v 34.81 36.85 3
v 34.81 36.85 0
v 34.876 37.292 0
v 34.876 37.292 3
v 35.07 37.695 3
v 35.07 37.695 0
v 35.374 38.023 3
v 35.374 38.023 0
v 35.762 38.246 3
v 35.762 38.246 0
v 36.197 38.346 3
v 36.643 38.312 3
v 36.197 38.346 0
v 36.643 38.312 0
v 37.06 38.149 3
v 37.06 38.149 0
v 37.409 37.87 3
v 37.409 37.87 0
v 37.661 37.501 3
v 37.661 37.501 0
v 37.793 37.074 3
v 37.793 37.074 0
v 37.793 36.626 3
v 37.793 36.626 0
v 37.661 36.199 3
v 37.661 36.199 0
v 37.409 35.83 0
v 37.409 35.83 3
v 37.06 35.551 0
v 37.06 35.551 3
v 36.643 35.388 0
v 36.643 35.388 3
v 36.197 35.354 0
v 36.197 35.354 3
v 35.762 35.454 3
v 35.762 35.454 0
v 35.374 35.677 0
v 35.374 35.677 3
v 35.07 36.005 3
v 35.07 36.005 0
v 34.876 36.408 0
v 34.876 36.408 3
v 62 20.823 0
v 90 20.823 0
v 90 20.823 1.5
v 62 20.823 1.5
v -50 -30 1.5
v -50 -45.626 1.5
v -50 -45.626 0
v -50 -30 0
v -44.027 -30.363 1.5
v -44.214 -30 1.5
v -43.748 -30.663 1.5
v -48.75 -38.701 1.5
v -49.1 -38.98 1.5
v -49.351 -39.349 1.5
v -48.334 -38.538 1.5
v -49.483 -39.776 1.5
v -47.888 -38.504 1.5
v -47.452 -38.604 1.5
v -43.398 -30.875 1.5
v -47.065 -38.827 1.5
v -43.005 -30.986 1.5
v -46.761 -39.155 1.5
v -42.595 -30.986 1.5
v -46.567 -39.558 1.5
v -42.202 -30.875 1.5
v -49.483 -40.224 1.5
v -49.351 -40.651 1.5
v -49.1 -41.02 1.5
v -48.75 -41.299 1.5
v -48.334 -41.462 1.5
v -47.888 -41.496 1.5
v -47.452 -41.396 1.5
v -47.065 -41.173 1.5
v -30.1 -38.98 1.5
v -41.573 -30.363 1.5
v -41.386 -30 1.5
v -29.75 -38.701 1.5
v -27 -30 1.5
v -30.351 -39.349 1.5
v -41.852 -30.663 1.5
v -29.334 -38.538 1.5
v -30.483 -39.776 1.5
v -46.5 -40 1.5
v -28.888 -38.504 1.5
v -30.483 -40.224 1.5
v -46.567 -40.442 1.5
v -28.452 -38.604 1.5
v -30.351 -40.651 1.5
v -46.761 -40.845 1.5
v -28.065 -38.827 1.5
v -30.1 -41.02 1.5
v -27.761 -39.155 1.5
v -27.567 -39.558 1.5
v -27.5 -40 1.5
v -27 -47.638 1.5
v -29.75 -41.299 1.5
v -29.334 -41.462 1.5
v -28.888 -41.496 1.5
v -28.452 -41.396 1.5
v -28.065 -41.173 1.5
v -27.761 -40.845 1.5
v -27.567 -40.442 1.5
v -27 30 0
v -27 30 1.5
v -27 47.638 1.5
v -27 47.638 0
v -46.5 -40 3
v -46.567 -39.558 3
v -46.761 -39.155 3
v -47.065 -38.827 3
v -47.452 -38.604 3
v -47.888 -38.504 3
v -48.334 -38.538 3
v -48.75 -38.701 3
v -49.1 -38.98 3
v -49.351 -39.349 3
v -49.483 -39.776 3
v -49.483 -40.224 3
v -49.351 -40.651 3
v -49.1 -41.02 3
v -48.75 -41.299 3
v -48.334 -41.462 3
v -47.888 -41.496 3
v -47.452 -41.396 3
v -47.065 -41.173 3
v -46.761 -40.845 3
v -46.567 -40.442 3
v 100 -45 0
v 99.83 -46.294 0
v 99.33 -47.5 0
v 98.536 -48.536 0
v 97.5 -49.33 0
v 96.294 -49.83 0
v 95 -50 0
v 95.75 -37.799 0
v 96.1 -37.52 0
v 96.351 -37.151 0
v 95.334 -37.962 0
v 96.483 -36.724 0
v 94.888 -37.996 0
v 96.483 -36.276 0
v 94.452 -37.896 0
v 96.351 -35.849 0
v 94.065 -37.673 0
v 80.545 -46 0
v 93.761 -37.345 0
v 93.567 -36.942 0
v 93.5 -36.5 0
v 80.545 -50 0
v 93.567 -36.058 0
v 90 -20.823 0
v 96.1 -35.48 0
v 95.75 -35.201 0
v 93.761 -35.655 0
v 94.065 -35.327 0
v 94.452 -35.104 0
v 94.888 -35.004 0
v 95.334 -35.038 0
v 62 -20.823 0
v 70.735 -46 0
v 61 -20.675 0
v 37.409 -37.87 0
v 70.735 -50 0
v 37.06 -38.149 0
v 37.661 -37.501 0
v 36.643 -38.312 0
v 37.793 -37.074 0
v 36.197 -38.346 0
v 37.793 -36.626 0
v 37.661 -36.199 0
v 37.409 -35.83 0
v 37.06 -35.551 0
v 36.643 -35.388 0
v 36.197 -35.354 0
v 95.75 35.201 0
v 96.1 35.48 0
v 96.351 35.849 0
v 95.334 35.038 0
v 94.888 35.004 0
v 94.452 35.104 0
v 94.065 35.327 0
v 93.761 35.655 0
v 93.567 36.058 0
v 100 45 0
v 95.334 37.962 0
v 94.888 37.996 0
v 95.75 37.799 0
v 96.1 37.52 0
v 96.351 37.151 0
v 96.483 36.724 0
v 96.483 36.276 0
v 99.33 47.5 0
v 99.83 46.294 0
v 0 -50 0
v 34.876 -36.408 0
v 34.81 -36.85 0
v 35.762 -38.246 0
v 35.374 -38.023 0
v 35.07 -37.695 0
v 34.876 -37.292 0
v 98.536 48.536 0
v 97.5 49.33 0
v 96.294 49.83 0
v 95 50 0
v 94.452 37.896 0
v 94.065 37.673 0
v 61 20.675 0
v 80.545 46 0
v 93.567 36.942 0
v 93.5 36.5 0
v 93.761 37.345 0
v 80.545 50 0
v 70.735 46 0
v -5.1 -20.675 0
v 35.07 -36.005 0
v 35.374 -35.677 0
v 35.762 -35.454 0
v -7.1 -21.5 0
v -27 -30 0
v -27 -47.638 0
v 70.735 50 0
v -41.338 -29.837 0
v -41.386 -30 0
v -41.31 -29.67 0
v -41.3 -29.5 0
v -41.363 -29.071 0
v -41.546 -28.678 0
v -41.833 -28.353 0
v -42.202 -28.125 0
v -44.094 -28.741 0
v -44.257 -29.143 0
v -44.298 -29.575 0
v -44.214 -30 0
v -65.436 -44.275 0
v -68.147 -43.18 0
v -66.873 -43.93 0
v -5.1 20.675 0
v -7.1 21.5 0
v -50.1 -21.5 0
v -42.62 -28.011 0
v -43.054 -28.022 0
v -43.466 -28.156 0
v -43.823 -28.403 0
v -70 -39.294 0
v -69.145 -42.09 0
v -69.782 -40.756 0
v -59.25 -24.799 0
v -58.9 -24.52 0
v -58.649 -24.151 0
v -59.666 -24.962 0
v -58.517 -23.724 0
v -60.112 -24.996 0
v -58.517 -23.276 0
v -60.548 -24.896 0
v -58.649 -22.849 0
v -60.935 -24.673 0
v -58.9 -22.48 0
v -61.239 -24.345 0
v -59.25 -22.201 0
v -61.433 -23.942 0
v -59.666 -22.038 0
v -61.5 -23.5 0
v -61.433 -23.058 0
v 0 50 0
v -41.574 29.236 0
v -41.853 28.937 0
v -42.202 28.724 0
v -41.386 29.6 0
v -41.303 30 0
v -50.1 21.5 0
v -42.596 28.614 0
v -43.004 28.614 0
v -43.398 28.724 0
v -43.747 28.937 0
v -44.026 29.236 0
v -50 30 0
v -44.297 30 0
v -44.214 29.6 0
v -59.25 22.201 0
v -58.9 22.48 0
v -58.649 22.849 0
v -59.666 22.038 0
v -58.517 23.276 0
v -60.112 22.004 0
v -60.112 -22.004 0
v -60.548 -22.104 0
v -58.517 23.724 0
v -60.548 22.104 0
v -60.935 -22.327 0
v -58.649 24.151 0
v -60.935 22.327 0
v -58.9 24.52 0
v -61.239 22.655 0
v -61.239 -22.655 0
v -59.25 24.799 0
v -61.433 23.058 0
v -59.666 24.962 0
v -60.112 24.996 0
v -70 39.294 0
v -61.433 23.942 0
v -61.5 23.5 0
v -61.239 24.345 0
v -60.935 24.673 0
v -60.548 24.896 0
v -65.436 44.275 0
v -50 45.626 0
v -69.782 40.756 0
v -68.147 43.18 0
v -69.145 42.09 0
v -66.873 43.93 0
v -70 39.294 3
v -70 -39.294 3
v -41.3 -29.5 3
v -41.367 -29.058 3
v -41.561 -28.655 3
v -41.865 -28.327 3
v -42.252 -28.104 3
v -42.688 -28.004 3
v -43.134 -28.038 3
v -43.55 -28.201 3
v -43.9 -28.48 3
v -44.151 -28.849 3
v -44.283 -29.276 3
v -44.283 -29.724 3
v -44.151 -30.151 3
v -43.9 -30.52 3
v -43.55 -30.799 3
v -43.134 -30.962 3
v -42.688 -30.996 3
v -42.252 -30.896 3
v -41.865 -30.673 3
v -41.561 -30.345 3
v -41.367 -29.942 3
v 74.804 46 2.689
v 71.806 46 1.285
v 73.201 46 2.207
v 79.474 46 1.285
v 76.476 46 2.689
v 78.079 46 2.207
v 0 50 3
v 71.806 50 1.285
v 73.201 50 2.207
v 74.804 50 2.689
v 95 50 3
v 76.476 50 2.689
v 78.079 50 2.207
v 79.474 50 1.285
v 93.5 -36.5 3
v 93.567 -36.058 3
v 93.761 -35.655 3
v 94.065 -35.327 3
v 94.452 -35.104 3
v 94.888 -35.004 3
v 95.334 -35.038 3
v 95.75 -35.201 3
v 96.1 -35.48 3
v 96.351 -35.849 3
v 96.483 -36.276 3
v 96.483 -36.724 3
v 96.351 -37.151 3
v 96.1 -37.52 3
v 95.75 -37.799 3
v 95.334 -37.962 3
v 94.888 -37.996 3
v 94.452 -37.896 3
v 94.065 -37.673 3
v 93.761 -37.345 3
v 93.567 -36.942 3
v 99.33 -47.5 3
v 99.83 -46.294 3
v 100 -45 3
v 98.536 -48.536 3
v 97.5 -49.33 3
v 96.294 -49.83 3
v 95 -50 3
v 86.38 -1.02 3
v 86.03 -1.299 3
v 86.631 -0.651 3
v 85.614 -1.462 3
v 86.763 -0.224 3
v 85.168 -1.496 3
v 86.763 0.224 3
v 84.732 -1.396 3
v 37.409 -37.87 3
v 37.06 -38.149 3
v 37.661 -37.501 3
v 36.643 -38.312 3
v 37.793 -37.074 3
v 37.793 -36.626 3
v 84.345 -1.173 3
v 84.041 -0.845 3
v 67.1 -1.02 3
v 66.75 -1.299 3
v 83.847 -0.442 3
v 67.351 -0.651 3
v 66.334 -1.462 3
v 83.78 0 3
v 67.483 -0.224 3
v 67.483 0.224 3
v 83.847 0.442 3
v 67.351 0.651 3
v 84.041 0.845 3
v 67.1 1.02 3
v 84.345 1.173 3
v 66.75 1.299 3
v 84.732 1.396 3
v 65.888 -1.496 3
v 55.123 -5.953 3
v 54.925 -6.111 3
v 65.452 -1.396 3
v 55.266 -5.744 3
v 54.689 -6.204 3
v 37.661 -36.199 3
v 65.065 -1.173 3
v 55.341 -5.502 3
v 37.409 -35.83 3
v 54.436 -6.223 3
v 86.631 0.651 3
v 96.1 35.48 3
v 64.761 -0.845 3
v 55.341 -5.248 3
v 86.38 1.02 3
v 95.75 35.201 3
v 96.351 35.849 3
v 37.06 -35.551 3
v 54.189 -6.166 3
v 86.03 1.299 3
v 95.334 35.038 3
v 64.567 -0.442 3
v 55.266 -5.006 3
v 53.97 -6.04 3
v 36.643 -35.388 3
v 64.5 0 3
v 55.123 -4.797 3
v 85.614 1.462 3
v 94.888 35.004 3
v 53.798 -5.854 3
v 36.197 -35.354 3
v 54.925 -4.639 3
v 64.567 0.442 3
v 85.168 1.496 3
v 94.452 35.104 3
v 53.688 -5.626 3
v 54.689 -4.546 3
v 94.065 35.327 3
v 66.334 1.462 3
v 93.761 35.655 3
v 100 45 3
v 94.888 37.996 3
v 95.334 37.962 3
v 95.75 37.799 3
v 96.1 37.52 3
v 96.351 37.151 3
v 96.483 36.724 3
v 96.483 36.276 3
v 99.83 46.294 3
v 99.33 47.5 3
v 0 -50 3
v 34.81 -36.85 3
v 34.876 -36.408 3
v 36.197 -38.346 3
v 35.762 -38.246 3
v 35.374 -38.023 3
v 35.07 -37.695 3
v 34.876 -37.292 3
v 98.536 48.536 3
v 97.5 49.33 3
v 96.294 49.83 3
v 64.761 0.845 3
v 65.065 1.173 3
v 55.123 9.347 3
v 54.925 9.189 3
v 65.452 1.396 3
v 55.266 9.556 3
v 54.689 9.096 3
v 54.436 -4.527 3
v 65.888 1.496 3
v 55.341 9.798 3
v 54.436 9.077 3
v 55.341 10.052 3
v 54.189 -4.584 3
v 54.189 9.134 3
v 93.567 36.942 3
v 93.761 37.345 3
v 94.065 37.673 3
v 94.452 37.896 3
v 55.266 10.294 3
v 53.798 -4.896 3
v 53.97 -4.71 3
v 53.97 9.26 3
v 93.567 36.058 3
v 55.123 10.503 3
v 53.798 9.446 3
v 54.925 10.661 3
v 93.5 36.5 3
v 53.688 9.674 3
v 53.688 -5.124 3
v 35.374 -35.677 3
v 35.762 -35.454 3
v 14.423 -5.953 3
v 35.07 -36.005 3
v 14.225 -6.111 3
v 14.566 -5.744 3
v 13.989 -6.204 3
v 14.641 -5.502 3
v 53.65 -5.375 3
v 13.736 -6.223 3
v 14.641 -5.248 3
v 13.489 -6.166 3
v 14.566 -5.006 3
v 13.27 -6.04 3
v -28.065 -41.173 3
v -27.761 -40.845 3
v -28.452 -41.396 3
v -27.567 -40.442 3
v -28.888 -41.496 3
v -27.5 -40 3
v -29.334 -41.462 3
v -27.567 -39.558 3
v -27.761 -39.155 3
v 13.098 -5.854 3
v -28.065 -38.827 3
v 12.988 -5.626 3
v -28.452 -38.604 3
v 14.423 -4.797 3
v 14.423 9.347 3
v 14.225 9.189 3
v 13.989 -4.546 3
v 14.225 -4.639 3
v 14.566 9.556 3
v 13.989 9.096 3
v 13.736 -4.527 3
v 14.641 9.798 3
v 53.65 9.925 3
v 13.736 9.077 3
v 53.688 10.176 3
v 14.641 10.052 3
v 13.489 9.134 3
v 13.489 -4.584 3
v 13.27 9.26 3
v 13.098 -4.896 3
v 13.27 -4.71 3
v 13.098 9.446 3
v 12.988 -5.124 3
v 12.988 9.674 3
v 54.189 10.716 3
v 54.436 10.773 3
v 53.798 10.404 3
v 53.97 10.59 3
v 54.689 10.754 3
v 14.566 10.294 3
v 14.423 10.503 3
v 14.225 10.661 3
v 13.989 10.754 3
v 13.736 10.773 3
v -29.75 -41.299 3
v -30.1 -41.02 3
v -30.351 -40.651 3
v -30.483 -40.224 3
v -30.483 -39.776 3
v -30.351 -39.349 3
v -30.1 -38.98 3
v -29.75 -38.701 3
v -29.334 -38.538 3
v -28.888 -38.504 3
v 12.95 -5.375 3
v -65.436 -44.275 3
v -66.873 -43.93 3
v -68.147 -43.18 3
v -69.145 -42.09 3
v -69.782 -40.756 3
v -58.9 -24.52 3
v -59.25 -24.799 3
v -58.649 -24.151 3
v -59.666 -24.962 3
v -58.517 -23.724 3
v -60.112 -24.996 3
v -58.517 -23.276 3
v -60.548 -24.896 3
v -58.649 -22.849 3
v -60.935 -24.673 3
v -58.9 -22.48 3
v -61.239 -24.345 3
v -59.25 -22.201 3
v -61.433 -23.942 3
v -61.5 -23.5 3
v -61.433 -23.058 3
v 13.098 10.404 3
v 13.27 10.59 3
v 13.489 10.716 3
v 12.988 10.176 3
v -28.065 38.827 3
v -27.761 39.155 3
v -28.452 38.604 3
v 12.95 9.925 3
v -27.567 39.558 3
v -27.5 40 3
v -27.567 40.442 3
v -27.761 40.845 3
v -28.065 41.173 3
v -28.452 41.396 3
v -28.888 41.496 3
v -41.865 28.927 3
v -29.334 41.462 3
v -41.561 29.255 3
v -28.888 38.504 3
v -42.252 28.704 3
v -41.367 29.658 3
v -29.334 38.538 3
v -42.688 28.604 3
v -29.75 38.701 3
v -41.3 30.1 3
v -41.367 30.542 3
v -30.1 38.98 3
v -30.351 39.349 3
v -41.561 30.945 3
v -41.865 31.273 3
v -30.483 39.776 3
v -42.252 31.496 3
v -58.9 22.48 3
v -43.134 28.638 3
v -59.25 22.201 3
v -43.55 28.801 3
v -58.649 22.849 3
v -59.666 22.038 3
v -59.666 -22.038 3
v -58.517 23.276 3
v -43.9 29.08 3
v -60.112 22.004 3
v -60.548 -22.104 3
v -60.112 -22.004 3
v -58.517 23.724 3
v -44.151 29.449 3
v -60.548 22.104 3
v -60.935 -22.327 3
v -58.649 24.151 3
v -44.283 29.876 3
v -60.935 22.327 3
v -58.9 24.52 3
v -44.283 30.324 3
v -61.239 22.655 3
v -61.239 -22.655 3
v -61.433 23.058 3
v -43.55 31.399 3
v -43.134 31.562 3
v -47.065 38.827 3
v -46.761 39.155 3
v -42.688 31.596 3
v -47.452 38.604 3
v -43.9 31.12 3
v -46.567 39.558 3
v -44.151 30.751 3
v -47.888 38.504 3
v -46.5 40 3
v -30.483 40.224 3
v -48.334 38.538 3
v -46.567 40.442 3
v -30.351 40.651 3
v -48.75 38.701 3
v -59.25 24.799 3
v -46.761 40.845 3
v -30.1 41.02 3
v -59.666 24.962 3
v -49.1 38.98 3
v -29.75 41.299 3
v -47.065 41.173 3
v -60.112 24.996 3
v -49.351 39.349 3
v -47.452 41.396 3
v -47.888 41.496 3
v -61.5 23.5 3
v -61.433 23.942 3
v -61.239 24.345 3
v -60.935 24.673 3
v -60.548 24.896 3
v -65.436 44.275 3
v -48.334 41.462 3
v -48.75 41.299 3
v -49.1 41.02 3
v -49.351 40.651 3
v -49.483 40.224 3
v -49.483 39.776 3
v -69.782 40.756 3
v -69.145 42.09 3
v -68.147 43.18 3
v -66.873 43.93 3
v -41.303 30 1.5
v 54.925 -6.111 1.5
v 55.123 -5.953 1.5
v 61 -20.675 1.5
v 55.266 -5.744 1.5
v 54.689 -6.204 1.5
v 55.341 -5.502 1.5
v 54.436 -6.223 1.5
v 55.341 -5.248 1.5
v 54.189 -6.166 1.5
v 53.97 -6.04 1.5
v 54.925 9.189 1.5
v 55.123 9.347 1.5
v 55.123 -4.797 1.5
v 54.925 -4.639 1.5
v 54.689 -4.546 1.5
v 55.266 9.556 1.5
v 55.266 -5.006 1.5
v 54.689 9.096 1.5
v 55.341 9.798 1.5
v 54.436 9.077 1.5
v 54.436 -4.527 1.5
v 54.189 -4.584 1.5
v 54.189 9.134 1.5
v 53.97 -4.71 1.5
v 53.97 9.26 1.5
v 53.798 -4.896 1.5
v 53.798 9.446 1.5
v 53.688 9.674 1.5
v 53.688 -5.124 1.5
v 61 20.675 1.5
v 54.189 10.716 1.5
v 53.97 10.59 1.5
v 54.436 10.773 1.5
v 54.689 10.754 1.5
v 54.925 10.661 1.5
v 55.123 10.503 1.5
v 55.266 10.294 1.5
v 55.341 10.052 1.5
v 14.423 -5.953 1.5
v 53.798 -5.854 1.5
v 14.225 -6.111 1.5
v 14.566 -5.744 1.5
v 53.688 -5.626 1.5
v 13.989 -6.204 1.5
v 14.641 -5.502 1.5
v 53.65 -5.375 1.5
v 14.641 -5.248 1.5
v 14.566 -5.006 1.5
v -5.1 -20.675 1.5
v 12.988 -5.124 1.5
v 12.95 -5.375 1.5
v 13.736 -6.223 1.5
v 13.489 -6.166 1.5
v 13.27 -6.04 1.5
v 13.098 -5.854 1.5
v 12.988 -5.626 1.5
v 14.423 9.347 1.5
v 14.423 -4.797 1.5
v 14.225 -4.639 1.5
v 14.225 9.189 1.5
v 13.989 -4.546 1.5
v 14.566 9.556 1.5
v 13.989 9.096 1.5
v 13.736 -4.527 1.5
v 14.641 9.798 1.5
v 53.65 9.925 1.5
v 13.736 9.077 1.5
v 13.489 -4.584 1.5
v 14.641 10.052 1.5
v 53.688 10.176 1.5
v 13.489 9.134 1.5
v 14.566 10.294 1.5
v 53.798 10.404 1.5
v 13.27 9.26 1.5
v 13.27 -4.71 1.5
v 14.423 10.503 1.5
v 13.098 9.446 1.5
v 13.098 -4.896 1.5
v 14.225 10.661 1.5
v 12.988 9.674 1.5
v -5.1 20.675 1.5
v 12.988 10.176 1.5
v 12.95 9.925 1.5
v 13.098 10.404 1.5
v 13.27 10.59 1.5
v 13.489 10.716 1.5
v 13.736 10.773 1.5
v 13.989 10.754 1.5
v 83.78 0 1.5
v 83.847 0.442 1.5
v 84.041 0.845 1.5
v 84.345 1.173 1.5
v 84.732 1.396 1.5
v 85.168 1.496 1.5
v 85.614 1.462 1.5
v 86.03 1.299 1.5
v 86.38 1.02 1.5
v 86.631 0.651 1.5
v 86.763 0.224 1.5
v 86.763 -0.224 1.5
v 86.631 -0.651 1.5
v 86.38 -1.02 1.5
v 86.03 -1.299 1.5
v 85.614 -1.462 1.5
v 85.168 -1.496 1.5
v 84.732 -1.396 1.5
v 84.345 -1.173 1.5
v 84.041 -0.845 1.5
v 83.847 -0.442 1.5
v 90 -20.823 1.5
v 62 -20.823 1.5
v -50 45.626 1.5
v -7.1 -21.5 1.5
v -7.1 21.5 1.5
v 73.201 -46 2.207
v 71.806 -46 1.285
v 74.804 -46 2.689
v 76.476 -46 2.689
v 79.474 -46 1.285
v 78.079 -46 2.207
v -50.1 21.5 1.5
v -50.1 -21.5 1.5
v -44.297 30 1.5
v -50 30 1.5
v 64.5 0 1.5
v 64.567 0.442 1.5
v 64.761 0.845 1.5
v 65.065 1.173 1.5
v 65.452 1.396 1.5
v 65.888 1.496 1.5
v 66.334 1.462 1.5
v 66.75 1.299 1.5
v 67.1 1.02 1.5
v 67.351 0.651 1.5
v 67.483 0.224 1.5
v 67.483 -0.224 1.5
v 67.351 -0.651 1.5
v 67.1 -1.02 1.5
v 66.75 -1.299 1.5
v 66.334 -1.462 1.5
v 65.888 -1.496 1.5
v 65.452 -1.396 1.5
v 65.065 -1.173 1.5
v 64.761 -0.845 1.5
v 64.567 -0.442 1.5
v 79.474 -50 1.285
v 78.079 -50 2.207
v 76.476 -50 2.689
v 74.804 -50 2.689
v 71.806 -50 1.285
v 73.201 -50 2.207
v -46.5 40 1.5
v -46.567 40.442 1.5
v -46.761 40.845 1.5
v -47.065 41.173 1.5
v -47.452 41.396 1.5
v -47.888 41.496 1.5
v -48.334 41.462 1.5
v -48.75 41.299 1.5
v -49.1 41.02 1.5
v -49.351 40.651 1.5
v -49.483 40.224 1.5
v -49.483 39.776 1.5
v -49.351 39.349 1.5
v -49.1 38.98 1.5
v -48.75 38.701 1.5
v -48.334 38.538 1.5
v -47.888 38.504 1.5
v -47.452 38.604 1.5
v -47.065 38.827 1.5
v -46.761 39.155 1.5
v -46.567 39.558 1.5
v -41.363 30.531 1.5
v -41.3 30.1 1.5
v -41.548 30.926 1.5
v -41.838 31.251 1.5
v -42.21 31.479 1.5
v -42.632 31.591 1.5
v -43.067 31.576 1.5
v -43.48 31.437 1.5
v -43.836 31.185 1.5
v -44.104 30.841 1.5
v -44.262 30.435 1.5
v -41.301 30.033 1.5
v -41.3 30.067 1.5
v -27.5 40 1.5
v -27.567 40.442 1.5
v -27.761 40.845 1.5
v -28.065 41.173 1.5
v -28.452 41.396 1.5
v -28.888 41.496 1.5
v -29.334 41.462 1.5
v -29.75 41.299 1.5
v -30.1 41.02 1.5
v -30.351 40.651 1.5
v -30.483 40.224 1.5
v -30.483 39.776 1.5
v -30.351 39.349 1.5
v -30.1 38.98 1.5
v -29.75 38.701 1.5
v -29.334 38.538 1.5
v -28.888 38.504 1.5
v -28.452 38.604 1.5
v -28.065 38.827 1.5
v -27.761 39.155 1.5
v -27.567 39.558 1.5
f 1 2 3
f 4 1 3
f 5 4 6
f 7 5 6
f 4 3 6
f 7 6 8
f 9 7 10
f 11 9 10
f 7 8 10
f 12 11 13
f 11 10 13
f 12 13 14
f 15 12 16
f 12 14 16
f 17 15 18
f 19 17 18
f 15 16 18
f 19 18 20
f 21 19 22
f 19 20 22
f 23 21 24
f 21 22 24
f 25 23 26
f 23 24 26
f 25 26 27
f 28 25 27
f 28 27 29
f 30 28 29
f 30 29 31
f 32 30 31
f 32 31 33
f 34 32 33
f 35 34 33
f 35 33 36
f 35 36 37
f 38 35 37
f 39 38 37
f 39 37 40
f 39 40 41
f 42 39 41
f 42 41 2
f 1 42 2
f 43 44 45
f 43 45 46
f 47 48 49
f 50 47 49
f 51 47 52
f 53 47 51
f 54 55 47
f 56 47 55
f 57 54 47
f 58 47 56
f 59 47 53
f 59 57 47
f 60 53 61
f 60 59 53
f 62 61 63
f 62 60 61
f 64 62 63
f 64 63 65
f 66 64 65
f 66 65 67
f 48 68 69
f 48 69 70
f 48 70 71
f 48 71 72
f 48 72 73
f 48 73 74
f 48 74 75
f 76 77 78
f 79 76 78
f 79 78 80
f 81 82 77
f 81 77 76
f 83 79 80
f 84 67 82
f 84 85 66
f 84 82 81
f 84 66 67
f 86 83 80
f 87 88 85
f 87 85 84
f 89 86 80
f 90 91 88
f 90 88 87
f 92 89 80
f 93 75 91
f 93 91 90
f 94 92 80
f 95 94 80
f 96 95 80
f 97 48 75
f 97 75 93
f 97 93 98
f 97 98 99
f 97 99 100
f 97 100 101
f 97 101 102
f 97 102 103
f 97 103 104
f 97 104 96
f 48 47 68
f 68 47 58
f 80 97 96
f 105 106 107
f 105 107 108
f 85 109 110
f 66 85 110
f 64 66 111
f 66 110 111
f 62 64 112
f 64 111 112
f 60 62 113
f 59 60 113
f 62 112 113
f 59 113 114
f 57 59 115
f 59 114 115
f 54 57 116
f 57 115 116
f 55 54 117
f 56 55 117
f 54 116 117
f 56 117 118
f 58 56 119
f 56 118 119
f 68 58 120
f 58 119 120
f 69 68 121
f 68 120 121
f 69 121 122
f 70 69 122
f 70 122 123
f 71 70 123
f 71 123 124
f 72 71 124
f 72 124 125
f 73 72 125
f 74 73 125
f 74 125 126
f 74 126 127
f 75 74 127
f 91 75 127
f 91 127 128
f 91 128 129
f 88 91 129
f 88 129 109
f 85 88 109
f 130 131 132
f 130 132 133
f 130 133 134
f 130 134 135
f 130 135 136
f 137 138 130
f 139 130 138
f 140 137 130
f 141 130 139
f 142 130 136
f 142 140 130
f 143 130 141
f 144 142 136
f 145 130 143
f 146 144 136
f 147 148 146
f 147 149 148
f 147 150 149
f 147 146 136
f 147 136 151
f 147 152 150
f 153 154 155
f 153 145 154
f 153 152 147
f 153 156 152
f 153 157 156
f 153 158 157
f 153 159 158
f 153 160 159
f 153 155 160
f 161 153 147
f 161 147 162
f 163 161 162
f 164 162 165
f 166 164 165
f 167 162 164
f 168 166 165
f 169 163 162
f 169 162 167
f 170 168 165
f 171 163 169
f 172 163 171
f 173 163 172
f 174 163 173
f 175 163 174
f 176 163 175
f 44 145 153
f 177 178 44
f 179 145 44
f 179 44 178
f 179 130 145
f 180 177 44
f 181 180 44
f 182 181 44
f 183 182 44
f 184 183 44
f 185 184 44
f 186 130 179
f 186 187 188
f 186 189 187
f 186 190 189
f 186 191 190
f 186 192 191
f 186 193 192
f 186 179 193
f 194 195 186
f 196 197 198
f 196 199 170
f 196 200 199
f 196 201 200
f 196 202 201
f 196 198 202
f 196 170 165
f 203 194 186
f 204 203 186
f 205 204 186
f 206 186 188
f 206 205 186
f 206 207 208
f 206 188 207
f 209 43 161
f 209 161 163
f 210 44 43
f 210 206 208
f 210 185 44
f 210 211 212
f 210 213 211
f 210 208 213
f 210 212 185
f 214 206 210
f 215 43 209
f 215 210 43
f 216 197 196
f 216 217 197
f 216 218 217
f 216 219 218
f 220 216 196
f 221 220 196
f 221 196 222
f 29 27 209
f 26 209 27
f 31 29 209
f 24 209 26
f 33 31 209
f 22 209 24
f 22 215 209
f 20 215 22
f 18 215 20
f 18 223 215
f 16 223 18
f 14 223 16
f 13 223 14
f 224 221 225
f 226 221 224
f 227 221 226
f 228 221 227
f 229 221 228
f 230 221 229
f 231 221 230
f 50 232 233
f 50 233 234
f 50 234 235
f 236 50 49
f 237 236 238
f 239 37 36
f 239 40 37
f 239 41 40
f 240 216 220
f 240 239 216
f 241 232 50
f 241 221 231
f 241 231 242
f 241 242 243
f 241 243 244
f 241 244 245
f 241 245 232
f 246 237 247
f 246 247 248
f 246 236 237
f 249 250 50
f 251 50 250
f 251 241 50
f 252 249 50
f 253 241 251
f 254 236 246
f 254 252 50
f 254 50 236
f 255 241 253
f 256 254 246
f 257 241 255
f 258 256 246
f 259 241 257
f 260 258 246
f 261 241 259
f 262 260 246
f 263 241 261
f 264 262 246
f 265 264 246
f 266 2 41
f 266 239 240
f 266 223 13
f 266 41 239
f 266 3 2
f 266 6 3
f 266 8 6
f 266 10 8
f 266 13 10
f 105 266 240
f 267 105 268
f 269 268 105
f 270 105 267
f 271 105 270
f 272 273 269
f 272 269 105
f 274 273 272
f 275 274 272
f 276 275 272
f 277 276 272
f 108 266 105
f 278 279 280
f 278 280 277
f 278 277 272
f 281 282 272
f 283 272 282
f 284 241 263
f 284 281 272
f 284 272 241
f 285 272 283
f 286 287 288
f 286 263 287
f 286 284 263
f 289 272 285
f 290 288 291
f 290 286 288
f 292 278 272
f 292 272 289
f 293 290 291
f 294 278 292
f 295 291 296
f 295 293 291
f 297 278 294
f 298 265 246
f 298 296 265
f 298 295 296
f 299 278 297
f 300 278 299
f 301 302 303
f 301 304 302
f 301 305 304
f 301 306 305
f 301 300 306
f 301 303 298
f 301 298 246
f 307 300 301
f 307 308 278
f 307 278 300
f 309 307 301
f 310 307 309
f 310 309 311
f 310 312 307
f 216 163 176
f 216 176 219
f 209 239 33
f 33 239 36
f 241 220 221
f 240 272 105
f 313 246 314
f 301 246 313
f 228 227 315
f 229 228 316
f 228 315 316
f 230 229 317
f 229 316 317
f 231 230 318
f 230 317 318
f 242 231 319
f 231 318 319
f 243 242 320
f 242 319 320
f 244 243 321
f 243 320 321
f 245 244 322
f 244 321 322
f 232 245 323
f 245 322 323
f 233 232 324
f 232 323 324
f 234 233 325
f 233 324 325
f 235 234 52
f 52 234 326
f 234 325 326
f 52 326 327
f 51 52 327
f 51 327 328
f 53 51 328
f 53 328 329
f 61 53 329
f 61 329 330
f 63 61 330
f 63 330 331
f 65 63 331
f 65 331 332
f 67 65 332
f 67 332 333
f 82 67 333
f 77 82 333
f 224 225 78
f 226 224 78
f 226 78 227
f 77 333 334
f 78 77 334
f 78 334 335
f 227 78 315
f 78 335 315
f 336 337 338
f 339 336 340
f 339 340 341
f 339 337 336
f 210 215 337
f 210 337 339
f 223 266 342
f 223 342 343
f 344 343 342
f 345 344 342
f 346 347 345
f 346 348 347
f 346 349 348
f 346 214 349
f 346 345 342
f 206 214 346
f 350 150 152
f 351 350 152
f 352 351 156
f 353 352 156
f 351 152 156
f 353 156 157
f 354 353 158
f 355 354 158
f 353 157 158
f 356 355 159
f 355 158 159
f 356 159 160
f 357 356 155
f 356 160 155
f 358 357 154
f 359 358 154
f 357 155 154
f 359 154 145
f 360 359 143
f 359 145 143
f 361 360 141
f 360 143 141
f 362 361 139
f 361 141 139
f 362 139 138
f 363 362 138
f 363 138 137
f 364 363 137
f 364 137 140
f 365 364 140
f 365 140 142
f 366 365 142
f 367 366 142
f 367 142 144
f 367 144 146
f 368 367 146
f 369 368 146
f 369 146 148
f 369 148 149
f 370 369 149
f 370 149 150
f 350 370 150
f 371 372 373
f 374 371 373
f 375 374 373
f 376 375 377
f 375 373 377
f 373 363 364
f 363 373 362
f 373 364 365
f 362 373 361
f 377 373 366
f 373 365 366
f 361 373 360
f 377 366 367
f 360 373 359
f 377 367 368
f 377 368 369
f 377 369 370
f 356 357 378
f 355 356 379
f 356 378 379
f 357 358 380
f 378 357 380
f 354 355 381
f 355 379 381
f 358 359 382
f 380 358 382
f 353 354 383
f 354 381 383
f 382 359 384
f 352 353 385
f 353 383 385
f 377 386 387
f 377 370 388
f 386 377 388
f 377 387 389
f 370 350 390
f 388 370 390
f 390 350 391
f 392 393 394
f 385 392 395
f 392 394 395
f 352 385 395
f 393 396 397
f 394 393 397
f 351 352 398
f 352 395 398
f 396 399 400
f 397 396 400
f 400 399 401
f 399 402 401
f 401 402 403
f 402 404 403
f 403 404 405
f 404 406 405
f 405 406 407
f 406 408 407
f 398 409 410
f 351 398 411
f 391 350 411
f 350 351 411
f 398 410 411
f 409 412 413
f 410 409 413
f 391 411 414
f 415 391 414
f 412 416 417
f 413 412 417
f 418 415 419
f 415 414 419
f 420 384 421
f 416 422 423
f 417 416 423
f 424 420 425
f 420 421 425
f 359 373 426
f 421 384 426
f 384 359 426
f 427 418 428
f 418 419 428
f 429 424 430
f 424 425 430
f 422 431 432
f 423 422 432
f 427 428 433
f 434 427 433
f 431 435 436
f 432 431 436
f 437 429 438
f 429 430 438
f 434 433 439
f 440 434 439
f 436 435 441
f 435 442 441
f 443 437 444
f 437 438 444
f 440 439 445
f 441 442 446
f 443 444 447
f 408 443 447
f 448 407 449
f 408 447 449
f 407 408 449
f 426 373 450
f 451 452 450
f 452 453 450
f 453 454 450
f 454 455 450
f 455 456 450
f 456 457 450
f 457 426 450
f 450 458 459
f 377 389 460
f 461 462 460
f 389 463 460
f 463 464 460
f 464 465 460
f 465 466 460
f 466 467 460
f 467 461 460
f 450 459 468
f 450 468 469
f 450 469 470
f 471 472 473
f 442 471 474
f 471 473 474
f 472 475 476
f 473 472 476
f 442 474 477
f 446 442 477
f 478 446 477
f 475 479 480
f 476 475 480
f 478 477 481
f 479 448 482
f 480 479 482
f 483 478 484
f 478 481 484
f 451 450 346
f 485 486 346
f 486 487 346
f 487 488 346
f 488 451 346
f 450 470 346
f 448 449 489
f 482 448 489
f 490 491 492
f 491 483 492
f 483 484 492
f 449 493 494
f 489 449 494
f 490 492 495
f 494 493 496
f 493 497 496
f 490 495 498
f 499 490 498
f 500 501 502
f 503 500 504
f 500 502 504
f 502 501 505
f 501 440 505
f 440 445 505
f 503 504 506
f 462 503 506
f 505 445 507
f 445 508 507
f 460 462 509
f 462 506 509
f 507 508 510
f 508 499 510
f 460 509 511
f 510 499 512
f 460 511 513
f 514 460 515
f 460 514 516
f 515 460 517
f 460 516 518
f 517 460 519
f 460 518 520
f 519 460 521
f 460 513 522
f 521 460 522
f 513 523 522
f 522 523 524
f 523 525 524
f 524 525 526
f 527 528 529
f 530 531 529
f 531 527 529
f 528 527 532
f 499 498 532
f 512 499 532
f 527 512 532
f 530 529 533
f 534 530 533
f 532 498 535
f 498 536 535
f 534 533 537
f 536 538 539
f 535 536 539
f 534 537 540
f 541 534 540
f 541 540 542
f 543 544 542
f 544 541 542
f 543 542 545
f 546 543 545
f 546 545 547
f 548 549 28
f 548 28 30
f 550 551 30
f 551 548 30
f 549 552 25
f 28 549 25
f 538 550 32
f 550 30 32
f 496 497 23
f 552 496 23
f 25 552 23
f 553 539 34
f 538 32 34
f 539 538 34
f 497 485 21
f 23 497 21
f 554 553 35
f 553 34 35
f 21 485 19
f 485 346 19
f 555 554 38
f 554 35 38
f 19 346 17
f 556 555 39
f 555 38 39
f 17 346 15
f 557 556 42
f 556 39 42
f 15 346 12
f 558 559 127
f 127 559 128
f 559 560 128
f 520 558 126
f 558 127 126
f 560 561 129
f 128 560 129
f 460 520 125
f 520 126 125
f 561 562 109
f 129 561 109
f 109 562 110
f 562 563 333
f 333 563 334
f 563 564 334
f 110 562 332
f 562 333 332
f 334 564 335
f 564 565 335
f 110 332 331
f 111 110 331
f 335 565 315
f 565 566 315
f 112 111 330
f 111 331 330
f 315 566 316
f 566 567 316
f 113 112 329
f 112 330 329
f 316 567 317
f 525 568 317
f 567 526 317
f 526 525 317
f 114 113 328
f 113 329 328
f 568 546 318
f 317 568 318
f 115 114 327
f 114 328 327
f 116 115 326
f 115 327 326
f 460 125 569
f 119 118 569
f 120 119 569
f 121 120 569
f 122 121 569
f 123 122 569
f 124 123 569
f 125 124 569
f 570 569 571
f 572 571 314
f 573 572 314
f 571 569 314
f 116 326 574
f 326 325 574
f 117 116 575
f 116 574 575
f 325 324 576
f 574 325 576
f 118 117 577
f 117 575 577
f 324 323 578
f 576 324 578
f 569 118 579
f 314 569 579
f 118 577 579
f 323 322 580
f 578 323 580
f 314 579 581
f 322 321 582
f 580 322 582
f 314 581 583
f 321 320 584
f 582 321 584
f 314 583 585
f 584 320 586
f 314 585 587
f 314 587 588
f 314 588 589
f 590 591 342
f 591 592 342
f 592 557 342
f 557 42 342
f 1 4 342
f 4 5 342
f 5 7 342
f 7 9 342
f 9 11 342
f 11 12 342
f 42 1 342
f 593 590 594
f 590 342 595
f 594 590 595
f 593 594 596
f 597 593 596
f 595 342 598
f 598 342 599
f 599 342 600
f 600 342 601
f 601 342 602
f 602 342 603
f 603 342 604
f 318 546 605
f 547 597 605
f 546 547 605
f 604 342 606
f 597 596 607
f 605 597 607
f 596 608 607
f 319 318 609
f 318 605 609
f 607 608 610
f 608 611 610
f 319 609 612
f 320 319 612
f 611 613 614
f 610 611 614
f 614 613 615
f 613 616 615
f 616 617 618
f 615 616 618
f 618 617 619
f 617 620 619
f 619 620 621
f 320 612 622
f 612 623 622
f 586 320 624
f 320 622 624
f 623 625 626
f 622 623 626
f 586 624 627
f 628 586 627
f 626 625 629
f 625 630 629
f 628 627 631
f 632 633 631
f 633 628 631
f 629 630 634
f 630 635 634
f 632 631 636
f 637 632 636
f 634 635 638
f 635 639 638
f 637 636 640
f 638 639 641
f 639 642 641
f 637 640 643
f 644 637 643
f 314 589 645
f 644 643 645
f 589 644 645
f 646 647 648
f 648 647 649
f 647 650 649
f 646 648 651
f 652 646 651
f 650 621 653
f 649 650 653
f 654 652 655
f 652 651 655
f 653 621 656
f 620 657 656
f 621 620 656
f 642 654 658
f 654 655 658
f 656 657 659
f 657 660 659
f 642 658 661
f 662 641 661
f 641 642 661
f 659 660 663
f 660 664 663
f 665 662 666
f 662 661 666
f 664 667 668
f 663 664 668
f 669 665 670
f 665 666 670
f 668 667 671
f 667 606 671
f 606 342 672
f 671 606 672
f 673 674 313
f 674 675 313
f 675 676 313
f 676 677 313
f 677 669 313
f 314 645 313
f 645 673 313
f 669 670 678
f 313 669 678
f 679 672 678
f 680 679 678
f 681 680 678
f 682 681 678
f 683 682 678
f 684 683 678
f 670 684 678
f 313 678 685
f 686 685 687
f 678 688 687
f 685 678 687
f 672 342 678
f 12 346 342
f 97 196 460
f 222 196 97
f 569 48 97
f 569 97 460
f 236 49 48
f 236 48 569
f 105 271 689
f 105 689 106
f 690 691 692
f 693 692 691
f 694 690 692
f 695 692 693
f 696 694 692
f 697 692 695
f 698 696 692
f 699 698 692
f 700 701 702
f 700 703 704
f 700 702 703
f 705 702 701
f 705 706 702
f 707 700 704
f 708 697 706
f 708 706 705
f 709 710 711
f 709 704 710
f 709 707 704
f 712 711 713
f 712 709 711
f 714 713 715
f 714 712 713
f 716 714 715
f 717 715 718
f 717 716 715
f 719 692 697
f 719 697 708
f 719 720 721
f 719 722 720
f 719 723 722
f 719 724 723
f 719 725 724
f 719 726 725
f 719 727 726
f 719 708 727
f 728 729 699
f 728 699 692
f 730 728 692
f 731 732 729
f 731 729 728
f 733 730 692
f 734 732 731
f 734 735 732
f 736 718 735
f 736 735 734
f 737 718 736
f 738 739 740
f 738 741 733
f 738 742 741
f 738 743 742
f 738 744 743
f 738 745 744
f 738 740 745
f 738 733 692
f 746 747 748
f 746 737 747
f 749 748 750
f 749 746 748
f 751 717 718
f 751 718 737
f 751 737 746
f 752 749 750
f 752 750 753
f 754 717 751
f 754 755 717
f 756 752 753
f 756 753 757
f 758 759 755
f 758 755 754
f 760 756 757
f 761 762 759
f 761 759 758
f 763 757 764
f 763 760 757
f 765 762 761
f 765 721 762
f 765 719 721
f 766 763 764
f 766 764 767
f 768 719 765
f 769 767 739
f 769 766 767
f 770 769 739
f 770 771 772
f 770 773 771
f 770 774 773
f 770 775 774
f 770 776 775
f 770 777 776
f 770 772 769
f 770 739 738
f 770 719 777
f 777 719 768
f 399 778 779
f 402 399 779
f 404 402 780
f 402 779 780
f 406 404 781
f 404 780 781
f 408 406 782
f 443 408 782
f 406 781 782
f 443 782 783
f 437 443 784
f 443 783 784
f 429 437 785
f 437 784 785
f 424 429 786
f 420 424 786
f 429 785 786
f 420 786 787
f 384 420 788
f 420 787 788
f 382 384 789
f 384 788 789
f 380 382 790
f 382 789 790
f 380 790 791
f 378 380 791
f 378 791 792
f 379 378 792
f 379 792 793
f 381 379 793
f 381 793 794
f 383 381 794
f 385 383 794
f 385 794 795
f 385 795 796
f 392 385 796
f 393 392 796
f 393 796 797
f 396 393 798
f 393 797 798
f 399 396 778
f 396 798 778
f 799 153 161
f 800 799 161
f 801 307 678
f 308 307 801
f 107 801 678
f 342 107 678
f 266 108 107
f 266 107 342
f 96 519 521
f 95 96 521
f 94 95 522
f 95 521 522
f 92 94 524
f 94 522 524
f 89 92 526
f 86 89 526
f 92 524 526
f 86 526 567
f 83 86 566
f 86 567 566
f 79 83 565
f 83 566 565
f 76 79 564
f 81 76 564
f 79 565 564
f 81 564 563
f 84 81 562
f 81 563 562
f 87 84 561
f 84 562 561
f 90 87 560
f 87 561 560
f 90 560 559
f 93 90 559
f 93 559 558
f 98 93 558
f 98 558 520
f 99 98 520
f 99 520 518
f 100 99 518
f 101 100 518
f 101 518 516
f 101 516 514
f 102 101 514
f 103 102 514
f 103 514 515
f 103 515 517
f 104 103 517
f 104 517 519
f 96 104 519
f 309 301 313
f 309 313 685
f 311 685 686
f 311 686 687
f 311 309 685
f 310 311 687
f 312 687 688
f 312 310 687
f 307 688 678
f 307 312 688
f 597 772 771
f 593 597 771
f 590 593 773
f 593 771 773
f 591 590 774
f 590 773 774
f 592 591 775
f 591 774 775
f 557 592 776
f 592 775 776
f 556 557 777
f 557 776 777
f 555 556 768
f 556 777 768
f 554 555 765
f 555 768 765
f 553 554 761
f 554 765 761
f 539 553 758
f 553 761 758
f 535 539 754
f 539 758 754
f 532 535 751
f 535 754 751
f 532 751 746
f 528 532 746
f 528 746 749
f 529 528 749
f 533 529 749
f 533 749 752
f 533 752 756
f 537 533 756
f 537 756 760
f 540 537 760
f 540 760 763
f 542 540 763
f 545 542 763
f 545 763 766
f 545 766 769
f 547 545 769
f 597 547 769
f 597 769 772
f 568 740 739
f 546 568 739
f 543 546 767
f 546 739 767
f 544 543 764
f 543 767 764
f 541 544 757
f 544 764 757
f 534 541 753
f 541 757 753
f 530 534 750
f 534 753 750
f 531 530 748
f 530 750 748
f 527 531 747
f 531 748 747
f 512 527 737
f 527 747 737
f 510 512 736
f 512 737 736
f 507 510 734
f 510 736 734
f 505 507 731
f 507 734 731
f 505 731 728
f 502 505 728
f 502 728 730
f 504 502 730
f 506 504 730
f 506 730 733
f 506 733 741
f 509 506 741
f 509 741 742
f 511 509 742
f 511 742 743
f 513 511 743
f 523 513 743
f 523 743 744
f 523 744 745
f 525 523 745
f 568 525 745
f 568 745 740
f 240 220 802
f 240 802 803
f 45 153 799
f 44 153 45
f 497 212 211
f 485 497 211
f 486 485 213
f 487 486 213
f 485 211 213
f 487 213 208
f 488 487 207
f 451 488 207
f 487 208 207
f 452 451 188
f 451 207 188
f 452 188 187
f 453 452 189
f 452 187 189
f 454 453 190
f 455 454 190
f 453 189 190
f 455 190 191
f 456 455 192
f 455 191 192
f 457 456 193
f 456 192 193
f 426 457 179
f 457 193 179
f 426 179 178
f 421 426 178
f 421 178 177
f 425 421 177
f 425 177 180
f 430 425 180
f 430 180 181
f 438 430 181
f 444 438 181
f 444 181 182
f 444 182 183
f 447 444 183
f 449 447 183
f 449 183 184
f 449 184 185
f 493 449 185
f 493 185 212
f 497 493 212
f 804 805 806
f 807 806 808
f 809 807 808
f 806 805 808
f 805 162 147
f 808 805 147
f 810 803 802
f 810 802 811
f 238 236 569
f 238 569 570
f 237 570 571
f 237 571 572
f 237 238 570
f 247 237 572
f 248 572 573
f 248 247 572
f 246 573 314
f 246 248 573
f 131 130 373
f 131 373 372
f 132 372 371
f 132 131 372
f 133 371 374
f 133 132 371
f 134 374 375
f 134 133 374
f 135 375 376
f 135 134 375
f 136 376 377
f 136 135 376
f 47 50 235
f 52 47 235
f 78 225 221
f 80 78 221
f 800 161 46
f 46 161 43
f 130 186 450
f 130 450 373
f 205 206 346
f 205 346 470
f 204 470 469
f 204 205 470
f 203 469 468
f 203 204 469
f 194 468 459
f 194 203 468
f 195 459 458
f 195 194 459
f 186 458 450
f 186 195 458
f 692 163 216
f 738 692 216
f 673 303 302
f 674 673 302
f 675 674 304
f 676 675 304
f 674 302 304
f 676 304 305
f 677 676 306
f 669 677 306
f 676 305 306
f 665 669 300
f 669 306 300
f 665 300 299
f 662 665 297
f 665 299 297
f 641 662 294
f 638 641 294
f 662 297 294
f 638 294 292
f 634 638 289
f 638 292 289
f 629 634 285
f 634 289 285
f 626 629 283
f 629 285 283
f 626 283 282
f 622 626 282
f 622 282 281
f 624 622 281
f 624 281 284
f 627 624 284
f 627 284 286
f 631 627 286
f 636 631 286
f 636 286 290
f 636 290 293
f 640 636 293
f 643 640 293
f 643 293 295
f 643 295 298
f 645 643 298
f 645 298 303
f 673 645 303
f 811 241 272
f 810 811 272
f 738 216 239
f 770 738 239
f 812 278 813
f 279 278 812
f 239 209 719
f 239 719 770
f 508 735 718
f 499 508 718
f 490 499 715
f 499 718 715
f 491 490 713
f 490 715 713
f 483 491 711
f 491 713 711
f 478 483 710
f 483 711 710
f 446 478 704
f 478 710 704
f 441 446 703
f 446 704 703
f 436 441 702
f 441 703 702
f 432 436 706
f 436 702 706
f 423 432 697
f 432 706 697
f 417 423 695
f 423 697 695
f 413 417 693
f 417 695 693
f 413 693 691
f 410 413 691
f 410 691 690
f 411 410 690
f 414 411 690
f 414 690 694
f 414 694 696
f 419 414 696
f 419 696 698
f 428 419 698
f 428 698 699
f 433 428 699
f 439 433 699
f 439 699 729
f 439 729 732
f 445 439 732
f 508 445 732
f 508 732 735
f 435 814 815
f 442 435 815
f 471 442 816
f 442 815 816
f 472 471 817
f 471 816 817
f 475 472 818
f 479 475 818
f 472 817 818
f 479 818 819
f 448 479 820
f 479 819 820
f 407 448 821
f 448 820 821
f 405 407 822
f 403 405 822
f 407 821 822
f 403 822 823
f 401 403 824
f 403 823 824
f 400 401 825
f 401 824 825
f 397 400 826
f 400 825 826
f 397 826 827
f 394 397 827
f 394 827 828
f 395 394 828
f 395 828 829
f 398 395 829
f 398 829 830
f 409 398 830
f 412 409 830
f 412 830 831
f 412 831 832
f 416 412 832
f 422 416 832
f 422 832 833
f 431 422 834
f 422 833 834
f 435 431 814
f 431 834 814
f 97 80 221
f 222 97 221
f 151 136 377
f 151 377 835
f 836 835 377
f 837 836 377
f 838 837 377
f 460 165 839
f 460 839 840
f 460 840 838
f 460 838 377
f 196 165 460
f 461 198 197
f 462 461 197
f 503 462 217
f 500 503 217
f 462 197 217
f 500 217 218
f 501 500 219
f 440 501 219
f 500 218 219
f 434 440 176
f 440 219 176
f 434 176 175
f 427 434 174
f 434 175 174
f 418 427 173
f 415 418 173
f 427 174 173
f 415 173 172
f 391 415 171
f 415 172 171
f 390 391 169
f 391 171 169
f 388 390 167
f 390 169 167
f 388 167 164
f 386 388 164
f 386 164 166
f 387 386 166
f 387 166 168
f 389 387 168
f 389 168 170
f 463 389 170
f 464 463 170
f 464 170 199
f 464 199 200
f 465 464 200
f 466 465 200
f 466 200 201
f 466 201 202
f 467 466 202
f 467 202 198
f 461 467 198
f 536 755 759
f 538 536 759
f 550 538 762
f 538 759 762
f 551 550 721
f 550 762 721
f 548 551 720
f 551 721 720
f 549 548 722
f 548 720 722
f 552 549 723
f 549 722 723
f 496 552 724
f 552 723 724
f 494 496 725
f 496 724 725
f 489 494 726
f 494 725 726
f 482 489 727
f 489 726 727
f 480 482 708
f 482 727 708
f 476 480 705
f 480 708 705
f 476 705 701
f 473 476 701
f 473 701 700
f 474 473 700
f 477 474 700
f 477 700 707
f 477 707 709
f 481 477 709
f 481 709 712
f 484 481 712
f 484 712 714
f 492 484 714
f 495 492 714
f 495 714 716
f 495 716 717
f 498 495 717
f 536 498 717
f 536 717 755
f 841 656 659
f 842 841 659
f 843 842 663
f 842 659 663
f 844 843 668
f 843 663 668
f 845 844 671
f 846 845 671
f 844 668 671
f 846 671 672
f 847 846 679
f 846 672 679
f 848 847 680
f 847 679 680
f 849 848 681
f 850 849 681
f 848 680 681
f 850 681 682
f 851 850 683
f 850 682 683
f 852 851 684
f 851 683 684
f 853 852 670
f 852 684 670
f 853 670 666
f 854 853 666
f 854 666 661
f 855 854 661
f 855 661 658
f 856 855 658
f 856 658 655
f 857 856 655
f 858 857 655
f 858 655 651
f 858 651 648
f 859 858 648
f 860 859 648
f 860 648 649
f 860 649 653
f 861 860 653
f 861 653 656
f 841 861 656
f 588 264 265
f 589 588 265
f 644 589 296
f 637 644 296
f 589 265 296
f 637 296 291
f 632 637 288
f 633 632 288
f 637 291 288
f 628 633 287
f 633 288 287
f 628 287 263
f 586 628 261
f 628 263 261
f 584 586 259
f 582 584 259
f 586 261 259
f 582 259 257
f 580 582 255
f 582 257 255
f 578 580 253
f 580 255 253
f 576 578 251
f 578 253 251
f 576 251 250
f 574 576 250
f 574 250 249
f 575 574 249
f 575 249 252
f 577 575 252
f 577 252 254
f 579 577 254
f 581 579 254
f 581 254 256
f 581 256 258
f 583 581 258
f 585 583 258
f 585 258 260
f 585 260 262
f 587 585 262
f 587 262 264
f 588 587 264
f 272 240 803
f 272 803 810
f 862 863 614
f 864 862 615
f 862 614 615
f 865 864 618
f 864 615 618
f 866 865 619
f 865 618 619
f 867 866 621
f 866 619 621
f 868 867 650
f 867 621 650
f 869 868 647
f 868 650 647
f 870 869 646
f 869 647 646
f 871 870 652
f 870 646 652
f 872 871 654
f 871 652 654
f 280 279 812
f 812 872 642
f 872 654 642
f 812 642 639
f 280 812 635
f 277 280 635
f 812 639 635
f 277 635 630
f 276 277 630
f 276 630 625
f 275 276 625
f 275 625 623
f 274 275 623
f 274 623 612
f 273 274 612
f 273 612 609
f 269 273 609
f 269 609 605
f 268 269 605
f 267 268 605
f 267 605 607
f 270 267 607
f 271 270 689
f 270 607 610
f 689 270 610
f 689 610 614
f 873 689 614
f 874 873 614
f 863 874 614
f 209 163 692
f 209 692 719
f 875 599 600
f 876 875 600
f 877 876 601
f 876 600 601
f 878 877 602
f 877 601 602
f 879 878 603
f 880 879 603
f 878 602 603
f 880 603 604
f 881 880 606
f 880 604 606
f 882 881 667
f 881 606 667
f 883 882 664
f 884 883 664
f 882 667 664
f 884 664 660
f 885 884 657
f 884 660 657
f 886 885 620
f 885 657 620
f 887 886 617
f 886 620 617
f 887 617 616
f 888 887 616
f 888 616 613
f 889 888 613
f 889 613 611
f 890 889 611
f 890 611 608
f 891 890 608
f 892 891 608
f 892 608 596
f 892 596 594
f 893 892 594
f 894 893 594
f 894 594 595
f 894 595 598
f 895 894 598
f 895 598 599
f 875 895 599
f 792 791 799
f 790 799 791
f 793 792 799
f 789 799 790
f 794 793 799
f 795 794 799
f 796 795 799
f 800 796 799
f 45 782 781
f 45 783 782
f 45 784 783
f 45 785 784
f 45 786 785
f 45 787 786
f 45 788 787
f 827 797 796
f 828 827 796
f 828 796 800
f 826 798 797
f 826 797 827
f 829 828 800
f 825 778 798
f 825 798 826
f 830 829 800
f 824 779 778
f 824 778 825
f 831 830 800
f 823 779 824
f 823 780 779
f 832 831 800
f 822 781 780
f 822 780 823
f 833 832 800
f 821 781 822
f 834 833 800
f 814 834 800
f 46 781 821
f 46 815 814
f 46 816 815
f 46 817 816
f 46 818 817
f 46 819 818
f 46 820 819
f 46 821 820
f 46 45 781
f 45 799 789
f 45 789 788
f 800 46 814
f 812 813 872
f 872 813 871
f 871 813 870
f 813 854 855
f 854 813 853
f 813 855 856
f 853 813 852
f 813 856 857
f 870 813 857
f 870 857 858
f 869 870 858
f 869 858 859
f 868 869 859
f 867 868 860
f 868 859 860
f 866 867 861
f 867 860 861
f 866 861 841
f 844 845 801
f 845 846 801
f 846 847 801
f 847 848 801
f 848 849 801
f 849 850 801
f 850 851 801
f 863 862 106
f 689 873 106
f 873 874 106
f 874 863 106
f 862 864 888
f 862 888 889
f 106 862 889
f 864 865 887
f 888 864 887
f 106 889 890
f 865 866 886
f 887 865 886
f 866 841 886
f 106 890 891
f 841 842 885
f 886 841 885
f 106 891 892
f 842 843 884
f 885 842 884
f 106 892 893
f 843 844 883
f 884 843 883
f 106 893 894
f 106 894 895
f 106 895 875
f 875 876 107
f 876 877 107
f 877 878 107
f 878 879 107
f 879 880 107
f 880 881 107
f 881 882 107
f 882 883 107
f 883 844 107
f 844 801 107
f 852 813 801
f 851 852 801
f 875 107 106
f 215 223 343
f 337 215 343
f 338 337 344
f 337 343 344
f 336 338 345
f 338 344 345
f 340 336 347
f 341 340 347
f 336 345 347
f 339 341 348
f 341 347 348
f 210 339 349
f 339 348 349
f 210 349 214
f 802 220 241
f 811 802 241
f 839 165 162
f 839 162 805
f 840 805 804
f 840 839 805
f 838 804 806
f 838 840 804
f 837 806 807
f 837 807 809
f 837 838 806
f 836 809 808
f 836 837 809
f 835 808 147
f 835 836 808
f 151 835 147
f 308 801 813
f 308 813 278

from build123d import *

# Parameters (mm, degrees)
BOSS_EXTRUDE1_DEPTH = 3
SKETCH2_R           = 1.5
CUT_EXTRUDE1_DEPTH  = 10
SKETCH6_W           = 23
SKETCH6_H           = 1.5
CUT_EXTRUDE2_DEPTH  = 20
SKETCH7_W           = 66.1
SKETCH7_H           = 41.35
CUT_EXTRUDE3_DEPTH  = 1.5
SKETCH9_R           = 0.85
CUT_EXTRUDE4_DEPTH  = 6.5
SKETCH10_W          = 43
SKETCH10_H          = 43
CUT_EXTRUDE5_DEPTH  = 1.5
SKETCH17_R          = 1.5
CUT_EXTRUDE11_DEPTH = 30.5
SKETCH18_R          = 1.5
CUT_EXTRUDE12_DEPTH = 30.5
SKETCH19_W          = 28
SKETCH19_H          = 41.645525892
CUT_EXTRUDE13_DEPTH = 1.5
SKETCH20_R          = 1.5
CUT_EXTRUDE14_DEPTH = 1.5
SKETCH21_R          = 1.5
CUT_EXTRUDE15_DEPTH = 10
SKETCH23_R          = 5.75
CUT_EXTRUDE16_DEPTH = 4


with BuildPart() as part:
    # Sketch1 → Boss-Extrude1 (new body)
    with BuildSketch(Plane.XY):
        with BuildLine():
            Line((-65.435778714, 44.275111174), (0, 50))
            Line((0, 50), (95, 50))
            ThreePointArc((95, 50), (98.535533906, 48.535533906), (100, 45))
            Line((100, 45), (100, -45))
            ThreePointArc((100, -45), (98.535533906, -48.535533906), (95, -50))
            Line((95, -50), (0, -50))
            Line((0, -50), (-65.435778714, -44.275111174))
            ThreePointArc((-65.435778714, -44.275111174), (-68.686386684, -42.672088721), (-70, -39.294137683))
            Line((-70, -39.294137683), (-70, 39.294137683))
            ThreePointArc((-70, 39.294137683), (-68.686386684, 42.672088721), (-65.435778714, 44.275111174))
        make_face()
    extrude(amount=BOSS_EXTRUDE1_DEPTH)

    # Sketch2 → Cut-Extrude1 (cut)
    with BuildSketch(Plane.XY.offset(3)):
        with Locations((-48, -40)):
            Circle(SKETCH2_R)
        with Locations((-29, -40)):
            Circle(SKETCH2_R)
        with Locations((-48, 40)):
            Circle(SKETCH2_R)
        with Locations((-29, 40)):
            Circle(SKETCH2_R)
    extrude(amount=-CUT_EXTRUDE1_DEPTH, mode=Mode.SUBTRACT)

    # Sketch6 → Cut-Extrude2 (cut)
    with BuildSketch(Plane(origin=(0, 50, 0), x_dir=(1, 0, 0), z_dir=(0, 1, 0))):
        with Locations((-38.5, -0.75)):
            Rectangle(SKETCH6_W, SKETCH6_H)
    cut_extrude2 = extrude(amount=-CUT_EXTRUDE2_DEPTH, mode=Mode.SUBTRACT)

    # Sketch7 → Cut-Extrude3 (cut)
    with BuildSketch(Plane(origin=(0, 0, 0), x_dir=(-1, 0, 0), z_dir=(0, 0, -1))):
        with Locations((-27.95, 0)):
            Rectangle(SKETCH7_W, SKETCH7_H)
    extrude(amount=-CUT_EXTRUDE3_DEPTH, mode=Mode.SUBTRACT)

    # Sketch9 → Cut-Extrude4 (cut)
    with BuildSketch(Plane(origin=(0, 0, 0), x_dir=(-1, 0, 0), z_dir=(0, 0, -1))):
        with Locations((-54.5, 9.925)):
            Circle(SKETCH9_R)
        with Locations((-54.5, -5.375)):
            Circle(SKETCH9_R)
        with Locations((-13.8, 9.925)):
            Circle(SKETCH9_R)
        with Locations((-13.8, -5.375)):
            Circle(SKETCH9_R)
    extrude(amount=-CUT_EXTRUDE4_DEPTH, mode=Mode.SUBTRACT)

    # Sketch10 → Cut-Extrude5 (cut)
    with BuildSketch(Plane(origin=(0, 0, 0), x_dir=(-1, 0, 0), z_dir=(0, 0, -1))):
        with Locations((28.6, 0)):
            Rectangle(SKETCH10_W, SKETCH10_H)
    extrude(amount=-CUT_EXTRUDE5_DEPTH, mode=Mode.SUBTRACT)

    # Mirror1: Cut-Extrude2 across plane
    add(cut_extrude2.mirror(Plane.ZX), mode=Mode.SUBTRACT)

    # Sketch17 → Cut-Extrude11 (cut)
    with BuildSketch(Plane(origin=(0, 0, 0), x_dir=(-1, 0, 0), z_dir=(0, 0, -1))):
        with Locations((-36.309541126, -36.85)):
            Circle(SKETCH17_R)
        with Locations((-36.309541126, 36.85)):
            Circle(SKETCH17_R)
    extrude(amount=-CUT_EXTRUDE11_DEPTH, mode=Mode.SUBTRACT)

    # Sketch18 → Cut-Extrude12 (cut)
    with BuildSketch(Plane(origin=(0, 0, 0), x_dir=(-1, 0, 0), z_dir=(0, 0, -1))):
        with Locations((-95, -36.5)):
            Circle(SKETCH18_R)
        with Locations((-95, 36.5)):
            Circle(SKETCH18_R)
        with Locations((60, -23.5)):
            Circle(SKETCH18_R)
        with Locations((60, 23.5)):
            Circle(SKETCH18_R)
    extrude(amount=-CUT_EXTRUDE12_DEPTH, mode=Mode.SUBTRACT)

    # Sketch19 → Cut-Extrude13 (cut)
    with BuildSketch(Plane(origin=(0, 0, 0), x_dir=(-1, 0, 0), z_dir=(0, 0, -1))):
        with Locations((-76, 0)):
            Rectangle(SKETCH19_W, SKETCH19_H)
    extrude(amount=-CUT_EXTRUDE13_DEPTH, mode=Mode.SUBTRACT)

    # Sketch20 → Cut-Extrude14 (cut)
    with BuildSketch(Plane(origin=(0, 0, 1.5), x_dir=(-1, 0, 0), z_dir=(0, 0, -1))):
        with Locations((-66, 0)):
            Circle(SKETCH20_R)
        with Locations((-85.28, 0)):
            Circle(SKETCH20_R)
    extrude(amount=-CUT_EXTRUDE14_DEPTH, mode=Mode.SUBTRACT)

    # Sketch21 → Cut-Extrude15 (cut)
    with BuildSketch(Plane.XY.offset(3)):
        with Locations((-42.8, 30.1)):
            Circle(SKETCH21_R)
        with Locations((-42.8, -29.5)):
            Circle(SKETCH21_R)
    extrude(amount=-CUT_EXTRUDE15_DEPTH, mode=Mode.SUBTRACT)

    # Sketch23 → Cut-Extrude16 (cut)
    with BuildSketch(Plane(origin=(0, 50, 0), x_dir=(1, 0, 0), z_dir=(0, 1, 0))):
        with Locations((75.64, 3)):
            Circle(SKETCH23_R)
    cut_extrude16 = extrude(amount=-CUT_EXTRUDE16_DEPTH, mode=Mode.SUBTRACT)

    # Mirror2: Cut-Extrude16 across plane
    add(cut_extrude16.mirror(Plane.ZX), mode=Mode.SUBTRACT)


solid = part.part
